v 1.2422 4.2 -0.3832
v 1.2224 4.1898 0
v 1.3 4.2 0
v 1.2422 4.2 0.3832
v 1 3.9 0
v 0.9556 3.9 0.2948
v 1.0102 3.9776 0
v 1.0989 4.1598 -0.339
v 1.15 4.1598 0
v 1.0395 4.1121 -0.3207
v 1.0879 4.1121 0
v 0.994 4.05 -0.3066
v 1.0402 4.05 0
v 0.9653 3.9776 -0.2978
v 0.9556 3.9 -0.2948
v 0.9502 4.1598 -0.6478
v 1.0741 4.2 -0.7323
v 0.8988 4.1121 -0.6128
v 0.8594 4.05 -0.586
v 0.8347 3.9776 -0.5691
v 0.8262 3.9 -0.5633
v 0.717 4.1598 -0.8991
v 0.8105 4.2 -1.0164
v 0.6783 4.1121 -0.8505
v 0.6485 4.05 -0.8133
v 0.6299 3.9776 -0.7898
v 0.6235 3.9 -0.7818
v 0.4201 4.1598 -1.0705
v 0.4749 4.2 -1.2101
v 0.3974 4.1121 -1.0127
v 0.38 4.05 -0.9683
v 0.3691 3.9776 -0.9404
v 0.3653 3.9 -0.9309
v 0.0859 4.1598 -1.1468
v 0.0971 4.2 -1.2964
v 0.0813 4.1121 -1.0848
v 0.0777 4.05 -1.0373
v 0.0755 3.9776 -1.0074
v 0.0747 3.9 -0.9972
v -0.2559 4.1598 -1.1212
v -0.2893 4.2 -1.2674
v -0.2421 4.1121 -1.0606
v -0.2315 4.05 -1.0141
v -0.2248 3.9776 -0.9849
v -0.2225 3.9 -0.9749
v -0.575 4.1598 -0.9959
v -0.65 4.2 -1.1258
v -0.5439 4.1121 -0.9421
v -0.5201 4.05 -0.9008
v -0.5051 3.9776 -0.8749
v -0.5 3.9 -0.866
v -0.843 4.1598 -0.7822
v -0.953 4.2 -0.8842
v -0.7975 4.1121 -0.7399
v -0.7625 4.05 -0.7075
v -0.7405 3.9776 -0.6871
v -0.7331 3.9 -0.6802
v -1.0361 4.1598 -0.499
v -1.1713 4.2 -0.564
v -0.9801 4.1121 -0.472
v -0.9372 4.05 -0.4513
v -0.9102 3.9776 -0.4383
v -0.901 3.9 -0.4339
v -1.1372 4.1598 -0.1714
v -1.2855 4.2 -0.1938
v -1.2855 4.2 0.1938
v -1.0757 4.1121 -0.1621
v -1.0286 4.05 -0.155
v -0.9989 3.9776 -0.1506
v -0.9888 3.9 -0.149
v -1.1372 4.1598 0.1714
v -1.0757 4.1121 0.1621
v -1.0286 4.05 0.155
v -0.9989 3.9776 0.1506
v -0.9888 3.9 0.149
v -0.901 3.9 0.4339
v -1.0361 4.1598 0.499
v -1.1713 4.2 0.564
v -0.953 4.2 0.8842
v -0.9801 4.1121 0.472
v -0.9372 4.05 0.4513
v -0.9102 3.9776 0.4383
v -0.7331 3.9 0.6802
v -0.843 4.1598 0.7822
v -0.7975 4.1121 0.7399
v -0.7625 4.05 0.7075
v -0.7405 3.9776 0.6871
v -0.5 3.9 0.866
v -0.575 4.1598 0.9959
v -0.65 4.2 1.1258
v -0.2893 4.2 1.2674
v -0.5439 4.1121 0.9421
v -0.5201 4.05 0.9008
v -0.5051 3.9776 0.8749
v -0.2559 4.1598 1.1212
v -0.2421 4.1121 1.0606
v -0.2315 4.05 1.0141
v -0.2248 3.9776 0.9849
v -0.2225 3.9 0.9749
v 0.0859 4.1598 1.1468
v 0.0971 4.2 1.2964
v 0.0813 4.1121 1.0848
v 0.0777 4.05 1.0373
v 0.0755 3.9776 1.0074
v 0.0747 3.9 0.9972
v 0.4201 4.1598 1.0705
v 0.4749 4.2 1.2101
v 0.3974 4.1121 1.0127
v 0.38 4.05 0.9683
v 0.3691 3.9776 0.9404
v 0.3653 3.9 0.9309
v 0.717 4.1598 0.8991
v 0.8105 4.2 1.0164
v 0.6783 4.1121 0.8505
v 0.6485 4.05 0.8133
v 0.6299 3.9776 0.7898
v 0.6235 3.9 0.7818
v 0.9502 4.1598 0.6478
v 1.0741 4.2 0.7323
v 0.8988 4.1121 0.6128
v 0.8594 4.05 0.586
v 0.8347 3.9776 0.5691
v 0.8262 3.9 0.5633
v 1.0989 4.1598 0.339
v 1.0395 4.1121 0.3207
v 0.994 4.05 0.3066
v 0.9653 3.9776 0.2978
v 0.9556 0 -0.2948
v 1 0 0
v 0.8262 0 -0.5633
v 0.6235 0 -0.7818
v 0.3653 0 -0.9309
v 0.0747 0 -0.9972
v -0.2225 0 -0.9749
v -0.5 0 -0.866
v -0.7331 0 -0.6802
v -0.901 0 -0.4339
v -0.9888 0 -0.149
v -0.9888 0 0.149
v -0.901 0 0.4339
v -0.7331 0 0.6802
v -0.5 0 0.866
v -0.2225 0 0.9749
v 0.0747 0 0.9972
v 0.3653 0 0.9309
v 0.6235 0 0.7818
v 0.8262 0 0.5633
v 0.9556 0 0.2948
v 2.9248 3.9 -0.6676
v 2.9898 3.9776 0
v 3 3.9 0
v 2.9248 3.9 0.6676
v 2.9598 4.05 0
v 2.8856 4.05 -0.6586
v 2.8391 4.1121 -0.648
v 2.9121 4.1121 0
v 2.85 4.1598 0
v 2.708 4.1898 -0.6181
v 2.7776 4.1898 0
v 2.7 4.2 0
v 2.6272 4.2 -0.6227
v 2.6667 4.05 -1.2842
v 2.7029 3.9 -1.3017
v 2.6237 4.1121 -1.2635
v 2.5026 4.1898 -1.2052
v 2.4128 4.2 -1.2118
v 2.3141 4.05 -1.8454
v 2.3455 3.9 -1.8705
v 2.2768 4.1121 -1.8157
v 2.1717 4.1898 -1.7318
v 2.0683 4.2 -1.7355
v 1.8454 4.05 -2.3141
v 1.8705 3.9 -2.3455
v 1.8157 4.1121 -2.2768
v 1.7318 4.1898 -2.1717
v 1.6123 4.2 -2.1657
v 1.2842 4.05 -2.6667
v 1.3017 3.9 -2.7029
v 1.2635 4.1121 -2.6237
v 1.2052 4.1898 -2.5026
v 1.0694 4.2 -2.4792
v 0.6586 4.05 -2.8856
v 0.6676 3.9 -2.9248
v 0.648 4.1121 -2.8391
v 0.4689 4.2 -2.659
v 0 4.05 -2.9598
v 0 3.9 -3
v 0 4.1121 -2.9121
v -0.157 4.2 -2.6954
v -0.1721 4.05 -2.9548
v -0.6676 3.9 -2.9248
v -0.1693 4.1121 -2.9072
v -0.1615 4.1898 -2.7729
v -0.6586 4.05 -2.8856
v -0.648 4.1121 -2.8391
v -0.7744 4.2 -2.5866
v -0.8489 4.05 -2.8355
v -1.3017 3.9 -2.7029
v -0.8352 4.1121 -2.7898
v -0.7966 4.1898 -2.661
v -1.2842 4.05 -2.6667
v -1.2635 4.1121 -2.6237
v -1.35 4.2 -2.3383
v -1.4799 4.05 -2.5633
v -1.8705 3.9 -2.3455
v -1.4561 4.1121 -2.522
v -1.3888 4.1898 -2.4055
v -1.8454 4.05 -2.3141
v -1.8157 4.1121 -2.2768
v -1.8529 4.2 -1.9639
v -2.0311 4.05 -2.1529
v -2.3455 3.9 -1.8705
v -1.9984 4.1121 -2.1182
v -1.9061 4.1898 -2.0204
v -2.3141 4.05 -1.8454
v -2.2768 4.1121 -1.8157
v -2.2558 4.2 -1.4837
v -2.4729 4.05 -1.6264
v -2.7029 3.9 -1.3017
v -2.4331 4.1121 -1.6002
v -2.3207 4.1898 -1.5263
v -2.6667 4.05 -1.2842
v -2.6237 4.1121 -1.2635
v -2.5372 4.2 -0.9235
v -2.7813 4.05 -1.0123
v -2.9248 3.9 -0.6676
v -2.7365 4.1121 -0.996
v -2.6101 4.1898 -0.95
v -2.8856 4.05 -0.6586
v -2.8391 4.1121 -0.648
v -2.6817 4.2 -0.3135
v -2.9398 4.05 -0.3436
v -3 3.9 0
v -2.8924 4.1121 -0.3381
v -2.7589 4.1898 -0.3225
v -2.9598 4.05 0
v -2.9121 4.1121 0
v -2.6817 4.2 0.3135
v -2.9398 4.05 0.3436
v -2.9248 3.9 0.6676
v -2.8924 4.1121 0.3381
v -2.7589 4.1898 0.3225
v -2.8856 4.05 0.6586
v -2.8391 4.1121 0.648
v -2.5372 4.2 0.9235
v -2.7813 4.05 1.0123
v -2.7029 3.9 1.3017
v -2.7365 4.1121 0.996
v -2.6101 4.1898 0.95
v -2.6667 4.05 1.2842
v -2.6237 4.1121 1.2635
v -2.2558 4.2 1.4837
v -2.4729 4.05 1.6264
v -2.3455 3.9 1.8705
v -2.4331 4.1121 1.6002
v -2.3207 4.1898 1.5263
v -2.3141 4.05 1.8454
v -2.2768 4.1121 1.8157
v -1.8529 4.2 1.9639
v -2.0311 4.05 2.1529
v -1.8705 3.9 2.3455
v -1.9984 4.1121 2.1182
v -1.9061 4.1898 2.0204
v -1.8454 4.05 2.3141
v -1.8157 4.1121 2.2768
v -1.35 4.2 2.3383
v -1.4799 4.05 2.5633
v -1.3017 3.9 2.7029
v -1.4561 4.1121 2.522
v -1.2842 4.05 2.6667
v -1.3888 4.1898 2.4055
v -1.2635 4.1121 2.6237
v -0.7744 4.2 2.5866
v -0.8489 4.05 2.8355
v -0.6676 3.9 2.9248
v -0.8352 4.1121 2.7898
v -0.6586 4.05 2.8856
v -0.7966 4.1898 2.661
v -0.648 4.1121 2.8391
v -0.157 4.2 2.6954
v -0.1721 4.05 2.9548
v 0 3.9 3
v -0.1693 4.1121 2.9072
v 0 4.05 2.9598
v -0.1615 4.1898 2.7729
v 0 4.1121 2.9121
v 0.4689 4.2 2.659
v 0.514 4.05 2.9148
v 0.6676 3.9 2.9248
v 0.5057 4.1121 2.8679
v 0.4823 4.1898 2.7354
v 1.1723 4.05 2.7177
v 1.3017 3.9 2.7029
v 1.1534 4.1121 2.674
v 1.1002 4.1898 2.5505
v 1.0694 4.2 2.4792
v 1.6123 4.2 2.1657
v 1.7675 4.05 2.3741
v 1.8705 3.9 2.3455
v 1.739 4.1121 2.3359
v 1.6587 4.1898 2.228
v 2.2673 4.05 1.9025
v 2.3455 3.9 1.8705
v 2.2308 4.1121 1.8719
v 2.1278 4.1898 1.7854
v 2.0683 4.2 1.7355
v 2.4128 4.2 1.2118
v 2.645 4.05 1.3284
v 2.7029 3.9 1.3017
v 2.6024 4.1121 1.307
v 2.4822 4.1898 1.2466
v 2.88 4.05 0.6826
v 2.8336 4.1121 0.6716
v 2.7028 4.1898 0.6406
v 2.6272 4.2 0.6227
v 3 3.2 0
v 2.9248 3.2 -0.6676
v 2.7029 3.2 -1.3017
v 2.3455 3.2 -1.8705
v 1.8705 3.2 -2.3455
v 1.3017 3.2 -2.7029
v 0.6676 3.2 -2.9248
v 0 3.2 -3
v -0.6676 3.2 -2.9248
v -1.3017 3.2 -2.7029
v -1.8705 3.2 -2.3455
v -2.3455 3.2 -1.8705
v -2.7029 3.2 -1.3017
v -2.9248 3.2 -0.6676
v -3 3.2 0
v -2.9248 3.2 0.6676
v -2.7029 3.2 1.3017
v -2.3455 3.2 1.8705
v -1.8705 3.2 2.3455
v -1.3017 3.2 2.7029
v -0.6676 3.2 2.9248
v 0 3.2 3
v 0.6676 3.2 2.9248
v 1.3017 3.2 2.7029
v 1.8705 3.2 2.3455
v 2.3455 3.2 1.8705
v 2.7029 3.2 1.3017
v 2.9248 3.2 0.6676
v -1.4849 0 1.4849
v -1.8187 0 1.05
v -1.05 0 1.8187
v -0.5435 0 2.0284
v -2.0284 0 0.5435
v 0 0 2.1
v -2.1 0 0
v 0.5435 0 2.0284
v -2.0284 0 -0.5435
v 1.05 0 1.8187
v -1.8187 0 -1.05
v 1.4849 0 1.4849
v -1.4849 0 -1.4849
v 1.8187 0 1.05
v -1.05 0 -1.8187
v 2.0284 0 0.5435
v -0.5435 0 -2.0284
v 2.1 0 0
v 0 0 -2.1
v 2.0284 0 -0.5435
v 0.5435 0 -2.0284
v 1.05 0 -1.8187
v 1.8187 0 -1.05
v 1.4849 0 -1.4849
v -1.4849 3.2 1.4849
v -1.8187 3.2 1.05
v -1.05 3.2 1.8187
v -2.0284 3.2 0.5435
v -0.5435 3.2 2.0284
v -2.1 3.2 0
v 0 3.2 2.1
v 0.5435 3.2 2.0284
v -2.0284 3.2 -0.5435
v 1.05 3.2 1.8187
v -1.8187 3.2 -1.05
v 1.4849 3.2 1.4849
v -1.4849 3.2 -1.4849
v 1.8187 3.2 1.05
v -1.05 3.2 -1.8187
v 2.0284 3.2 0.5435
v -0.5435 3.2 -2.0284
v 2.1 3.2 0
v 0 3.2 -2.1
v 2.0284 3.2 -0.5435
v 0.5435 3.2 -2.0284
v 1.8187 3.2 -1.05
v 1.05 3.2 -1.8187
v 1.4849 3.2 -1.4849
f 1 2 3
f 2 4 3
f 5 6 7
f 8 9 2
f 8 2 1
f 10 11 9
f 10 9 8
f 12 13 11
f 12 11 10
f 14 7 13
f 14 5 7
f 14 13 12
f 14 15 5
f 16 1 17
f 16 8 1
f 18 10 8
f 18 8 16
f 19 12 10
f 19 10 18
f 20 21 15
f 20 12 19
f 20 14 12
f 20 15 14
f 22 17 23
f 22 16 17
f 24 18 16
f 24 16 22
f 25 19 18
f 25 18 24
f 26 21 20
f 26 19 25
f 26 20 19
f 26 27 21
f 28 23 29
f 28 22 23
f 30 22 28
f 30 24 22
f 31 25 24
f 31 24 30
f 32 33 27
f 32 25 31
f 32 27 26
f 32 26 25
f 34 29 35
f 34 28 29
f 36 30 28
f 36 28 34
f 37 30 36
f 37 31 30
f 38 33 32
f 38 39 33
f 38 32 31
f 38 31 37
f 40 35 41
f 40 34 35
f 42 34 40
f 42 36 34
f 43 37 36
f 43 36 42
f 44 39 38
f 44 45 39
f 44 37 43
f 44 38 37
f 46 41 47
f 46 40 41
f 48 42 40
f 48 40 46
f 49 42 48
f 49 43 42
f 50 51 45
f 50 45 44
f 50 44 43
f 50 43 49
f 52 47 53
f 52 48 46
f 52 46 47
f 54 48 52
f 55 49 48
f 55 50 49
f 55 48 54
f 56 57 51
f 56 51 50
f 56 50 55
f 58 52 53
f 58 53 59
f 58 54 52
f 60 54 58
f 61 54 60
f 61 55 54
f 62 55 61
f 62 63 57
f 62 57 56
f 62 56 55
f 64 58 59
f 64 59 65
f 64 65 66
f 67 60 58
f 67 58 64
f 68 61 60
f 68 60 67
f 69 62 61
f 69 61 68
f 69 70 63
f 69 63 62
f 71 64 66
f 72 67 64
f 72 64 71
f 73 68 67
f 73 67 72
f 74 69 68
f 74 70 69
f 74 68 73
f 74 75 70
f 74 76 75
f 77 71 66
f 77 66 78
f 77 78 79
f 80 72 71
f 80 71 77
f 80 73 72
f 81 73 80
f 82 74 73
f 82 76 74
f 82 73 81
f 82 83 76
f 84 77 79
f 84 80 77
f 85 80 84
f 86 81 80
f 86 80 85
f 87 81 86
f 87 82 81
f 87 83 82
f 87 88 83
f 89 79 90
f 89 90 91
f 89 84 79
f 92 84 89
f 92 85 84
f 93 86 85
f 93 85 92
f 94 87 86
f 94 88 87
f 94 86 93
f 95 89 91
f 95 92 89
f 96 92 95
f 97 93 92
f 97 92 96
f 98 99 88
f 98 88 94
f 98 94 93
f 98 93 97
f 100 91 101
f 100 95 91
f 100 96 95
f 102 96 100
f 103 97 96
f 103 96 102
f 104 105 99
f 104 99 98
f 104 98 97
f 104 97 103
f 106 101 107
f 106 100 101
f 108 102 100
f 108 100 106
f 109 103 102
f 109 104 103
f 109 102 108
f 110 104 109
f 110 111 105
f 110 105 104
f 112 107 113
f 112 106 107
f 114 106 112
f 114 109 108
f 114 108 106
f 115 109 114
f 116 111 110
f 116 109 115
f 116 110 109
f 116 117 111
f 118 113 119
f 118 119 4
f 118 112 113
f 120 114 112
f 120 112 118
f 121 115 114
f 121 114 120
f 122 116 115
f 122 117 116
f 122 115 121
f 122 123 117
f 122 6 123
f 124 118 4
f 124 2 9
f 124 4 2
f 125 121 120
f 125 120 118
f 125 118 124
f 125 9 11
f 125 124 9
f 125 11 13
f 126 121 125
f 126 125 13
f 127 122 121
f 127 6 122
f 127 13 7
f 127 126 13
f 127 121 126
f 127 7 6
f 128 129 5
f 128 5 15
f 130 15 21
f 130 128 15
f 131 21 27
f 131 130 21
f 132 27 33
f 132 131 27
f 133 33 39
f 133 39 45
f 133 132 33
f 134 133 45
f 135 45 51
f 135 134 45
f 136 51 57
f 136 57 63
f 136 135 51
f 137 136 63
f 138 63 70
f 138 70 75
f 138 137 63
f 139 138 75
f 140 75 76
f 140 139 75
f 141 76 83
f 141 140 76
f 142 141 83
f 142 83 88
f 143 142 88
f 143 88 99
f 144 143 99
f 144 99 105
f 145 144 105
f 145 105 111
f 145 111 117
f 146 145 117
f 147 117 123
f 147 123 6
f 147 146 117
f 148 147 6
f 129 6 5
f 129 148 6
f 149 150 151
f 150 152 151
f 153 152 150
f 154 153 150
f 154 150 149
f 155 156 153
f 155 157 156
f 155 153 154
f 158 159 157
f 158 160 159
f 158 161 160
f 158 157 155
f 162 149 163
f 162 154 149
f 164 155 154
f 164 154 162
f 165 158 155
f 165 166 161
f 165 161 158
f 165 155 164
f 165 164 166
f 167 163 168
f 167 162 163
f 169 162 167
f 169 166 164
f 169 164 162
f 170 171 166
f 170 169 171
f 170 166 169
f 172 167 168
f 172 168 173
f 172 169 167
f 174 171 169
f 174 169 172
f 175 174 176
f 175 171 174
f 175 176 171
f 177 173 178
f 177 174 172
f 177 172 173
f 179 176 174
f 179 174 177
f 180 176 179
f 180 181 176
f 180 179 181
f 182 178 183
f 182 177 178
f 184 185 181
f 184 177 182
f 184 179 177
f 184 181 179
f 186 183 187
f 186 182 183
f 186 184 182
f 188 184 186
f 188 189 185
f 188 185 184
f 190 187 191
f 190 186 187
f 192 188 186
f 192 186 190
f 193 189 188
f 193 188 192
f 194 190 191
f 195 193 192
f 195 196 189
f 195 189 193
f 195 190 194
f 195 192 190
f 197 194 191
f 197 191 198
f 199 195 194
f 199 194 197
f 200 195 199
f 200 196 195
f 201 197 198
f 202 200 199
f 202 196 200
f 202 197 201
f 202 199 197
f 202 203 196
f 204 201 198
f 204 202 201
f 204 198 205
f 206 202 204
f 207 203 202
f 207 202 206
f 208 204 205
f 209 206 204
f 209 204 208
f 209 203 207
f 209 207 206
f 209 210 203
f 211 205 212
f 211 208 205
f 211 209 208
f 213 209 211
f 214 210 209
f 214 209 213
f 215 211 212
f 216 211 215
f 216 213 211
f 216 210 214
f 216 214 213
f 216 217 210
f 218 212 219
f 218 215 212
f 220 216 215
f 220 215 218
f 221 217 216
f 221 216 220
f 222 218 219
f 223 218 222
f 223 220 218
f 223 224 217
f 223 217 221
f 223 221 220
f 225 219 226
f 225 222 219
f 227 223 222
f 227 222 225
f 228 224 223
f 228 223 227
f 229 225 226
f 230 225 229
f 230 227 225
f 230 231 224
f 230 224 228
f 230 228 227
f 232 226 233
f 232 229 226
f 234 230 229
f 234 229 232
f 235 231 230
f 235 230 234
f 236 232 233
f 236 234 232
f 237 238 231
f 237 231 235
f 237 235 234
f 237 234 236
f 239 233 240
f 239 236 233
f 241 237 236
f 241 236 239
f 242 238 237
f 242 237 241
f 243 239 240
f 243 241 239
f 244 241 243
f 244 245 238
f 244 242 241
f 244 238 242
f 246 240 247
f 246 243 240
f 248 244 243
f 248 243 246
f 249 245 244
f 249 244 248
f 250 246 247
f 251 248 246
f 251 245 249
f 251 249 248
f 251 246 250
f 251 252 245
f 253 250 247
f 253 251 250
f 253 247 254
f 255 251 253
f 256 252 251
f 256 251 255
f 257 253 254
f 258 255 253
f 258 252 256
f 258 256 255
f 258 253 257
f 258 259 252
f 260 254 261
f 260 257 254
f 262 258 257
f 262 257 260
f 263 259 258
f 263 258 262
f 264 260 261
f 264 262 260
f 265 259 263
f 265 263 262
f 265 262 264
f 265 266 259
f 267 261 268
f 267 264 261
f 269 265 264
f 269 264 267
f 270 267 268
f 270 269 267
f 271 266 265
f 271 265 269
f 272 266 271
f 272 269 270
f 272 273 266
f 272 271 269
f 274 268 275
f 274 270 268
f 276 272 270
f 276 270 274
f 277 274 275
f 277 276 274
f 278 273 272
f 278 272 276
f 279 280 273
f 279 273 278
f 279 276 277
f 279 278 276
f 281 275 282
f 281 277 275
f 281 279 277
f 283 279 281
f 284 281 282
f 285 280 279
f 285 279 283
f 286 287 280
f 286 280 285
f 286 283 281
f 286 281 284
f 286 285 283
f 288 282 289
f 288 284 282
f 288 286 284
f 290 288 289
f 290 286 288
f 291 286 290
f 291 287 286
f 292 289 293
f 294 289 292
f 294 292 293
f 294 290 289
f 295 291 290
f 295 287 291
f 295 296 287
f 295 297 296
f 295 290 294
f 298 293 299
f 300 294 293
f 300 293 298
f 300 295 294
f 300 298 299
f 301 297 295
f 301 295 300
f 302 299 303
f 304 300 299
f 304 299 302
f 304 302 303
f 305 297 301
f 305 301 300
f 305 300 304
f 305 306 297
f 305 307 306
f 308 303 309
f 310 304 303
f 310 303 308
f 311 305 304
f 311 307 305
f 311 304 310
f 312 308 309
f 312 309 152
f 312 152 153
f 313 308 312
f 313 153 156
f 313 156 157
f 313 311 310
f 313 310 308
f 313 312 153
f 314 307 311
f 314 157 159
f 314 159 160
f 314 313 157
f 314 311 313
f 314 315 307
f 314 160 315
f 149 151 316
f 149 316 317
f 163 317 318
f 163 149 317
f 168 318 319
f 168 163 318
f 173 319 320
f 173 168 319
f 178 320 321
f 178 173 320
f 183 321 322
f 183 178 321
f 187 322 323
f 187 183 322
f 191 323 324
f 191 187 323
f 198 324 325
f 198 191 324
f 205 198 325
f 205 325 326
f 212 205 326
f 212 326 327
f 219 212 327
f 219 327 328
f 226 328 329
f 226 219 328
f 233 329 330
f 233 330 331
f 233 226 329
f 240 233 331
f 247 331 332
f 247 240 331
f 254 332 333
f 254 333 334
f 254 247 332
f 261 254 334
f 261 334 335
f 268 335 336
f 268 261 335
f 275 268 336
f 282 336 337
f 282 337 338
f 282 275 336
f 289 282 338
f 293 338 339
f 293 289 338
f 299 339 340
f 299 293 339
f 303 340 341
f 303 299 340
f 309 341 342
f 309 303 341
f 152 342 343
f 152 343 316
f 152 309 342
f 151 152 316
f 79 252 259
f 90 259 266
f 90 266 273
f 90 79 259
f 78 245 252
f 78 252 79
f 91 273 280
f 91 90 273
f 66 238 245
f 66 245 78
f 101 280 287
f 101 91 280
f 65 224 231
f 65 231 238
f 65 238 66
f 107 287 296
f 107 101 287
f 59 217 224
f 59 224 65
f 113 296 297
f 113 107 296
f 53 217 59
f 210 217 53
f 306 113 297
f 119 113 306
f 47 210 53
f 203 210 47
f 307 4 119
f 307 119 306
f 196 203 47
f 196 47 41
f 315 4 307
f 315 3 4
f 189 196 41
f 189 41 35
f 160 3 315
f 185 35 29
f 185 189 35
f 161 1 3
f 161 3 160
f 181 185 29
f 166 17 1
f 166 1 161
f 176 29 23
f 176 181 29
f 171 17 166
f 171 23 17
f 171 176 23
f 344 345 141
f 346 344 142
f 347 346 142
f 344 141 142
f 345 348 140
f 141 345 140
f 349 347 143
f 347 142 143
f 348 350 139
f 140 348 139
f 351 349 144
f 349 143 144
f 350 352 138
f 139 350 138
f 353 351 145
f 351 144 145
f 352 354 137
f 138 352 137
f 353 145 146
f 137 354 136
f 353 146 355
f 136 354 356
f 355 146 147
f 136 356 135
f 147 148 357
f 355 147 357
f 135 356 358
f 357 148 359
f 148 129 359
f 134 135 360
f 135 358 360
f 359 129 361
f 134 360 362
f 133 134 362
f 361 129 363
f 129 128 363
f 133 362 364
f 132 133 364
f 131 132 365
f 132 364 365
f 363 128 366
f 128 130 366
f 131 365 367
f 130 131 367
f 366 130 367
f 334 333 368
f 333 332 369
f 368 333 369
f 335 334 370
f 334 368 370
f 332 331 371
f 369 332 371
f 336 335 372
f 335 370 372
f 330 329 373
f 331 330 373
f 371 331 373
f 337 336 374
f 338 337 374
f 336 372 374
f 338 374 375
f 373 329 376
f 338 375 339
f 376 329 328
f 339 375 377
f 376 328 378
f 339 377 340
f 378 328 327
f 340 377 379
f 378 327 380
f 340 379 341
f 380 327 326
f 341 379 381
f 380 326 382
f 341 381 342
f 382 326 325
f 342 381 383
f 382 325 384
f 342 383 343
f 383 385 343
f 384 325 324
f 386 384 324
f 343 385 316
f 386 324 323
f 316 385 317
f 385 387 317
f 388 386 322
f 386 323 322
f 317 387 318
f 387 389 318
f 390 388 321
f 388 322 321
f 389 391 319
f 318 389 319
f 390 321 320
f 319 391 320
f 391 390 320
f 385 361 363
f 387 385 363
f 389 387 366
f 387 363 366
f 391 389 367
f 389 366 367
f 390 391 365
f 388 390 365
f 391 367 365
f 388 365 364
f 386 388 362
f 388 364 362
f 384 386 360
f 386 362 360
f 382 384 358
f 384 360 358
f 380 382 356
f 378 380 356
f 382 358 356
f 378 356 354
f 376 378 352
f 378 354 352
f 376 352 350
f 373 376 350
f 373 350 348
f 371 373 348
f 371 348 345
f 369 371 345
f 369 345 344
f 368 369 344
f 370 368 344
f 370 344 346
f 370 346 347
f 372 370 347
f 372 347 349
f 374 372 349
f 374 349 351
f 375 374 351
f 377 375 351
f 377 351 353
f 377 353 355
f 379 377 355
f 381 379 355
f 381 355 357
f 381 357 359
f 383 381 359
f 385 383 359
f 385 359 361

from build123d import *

# Parameters (mm, degrees)
SKETCH_1_R      = 2.1
SKETCH_1_R_2    = 1
EXTRUDE_1_DEPTH = 4.2
SKETCH_2_R      = 3
SKETCH_2_R_2    = 2.1
EXTRUDE_3_DEPTH = 1
FILLET_1_R      = 0.3


with BuildPart() as part:
    # 草图1 → 凸台-拉伸1 (new body)
    with BuildSketch(Plane(origin=(0, 0, 0), x_dir=(1, 0, 0), z_dir=(0, 1, 0))):
        Circle(SKETCH_1_R)
        Circle(SKETCH_1_R_2, mode=Mode.SUBTRACT)
    extrude(amount=EXTRUDE_1_DEPTH)

    # 草图2 → 凸台-拉伸3 (add)
    with BuildSketch(Plane(origin=(0, 4.2, 0), x_dir=(1, 0, 0), z_dir=(0, 1, 0))):
        Circle(SKETCH_2_R)
        Circle(SKETCH_2_R_2, mode=Mode.SUBTRACT)
    extrude(amount=-EXTRUDE_3_DEPTH)

    # 圆角1
    fillet_1_edges = [part.edges().sort_by_distance(p)[0] for p in [
        (-3, 4.2, 0),
        (-1, 4.2, 0),
    ]]
    fillet(fillet_1_edges, radius=FILLET_1_R)


solid = part.part
